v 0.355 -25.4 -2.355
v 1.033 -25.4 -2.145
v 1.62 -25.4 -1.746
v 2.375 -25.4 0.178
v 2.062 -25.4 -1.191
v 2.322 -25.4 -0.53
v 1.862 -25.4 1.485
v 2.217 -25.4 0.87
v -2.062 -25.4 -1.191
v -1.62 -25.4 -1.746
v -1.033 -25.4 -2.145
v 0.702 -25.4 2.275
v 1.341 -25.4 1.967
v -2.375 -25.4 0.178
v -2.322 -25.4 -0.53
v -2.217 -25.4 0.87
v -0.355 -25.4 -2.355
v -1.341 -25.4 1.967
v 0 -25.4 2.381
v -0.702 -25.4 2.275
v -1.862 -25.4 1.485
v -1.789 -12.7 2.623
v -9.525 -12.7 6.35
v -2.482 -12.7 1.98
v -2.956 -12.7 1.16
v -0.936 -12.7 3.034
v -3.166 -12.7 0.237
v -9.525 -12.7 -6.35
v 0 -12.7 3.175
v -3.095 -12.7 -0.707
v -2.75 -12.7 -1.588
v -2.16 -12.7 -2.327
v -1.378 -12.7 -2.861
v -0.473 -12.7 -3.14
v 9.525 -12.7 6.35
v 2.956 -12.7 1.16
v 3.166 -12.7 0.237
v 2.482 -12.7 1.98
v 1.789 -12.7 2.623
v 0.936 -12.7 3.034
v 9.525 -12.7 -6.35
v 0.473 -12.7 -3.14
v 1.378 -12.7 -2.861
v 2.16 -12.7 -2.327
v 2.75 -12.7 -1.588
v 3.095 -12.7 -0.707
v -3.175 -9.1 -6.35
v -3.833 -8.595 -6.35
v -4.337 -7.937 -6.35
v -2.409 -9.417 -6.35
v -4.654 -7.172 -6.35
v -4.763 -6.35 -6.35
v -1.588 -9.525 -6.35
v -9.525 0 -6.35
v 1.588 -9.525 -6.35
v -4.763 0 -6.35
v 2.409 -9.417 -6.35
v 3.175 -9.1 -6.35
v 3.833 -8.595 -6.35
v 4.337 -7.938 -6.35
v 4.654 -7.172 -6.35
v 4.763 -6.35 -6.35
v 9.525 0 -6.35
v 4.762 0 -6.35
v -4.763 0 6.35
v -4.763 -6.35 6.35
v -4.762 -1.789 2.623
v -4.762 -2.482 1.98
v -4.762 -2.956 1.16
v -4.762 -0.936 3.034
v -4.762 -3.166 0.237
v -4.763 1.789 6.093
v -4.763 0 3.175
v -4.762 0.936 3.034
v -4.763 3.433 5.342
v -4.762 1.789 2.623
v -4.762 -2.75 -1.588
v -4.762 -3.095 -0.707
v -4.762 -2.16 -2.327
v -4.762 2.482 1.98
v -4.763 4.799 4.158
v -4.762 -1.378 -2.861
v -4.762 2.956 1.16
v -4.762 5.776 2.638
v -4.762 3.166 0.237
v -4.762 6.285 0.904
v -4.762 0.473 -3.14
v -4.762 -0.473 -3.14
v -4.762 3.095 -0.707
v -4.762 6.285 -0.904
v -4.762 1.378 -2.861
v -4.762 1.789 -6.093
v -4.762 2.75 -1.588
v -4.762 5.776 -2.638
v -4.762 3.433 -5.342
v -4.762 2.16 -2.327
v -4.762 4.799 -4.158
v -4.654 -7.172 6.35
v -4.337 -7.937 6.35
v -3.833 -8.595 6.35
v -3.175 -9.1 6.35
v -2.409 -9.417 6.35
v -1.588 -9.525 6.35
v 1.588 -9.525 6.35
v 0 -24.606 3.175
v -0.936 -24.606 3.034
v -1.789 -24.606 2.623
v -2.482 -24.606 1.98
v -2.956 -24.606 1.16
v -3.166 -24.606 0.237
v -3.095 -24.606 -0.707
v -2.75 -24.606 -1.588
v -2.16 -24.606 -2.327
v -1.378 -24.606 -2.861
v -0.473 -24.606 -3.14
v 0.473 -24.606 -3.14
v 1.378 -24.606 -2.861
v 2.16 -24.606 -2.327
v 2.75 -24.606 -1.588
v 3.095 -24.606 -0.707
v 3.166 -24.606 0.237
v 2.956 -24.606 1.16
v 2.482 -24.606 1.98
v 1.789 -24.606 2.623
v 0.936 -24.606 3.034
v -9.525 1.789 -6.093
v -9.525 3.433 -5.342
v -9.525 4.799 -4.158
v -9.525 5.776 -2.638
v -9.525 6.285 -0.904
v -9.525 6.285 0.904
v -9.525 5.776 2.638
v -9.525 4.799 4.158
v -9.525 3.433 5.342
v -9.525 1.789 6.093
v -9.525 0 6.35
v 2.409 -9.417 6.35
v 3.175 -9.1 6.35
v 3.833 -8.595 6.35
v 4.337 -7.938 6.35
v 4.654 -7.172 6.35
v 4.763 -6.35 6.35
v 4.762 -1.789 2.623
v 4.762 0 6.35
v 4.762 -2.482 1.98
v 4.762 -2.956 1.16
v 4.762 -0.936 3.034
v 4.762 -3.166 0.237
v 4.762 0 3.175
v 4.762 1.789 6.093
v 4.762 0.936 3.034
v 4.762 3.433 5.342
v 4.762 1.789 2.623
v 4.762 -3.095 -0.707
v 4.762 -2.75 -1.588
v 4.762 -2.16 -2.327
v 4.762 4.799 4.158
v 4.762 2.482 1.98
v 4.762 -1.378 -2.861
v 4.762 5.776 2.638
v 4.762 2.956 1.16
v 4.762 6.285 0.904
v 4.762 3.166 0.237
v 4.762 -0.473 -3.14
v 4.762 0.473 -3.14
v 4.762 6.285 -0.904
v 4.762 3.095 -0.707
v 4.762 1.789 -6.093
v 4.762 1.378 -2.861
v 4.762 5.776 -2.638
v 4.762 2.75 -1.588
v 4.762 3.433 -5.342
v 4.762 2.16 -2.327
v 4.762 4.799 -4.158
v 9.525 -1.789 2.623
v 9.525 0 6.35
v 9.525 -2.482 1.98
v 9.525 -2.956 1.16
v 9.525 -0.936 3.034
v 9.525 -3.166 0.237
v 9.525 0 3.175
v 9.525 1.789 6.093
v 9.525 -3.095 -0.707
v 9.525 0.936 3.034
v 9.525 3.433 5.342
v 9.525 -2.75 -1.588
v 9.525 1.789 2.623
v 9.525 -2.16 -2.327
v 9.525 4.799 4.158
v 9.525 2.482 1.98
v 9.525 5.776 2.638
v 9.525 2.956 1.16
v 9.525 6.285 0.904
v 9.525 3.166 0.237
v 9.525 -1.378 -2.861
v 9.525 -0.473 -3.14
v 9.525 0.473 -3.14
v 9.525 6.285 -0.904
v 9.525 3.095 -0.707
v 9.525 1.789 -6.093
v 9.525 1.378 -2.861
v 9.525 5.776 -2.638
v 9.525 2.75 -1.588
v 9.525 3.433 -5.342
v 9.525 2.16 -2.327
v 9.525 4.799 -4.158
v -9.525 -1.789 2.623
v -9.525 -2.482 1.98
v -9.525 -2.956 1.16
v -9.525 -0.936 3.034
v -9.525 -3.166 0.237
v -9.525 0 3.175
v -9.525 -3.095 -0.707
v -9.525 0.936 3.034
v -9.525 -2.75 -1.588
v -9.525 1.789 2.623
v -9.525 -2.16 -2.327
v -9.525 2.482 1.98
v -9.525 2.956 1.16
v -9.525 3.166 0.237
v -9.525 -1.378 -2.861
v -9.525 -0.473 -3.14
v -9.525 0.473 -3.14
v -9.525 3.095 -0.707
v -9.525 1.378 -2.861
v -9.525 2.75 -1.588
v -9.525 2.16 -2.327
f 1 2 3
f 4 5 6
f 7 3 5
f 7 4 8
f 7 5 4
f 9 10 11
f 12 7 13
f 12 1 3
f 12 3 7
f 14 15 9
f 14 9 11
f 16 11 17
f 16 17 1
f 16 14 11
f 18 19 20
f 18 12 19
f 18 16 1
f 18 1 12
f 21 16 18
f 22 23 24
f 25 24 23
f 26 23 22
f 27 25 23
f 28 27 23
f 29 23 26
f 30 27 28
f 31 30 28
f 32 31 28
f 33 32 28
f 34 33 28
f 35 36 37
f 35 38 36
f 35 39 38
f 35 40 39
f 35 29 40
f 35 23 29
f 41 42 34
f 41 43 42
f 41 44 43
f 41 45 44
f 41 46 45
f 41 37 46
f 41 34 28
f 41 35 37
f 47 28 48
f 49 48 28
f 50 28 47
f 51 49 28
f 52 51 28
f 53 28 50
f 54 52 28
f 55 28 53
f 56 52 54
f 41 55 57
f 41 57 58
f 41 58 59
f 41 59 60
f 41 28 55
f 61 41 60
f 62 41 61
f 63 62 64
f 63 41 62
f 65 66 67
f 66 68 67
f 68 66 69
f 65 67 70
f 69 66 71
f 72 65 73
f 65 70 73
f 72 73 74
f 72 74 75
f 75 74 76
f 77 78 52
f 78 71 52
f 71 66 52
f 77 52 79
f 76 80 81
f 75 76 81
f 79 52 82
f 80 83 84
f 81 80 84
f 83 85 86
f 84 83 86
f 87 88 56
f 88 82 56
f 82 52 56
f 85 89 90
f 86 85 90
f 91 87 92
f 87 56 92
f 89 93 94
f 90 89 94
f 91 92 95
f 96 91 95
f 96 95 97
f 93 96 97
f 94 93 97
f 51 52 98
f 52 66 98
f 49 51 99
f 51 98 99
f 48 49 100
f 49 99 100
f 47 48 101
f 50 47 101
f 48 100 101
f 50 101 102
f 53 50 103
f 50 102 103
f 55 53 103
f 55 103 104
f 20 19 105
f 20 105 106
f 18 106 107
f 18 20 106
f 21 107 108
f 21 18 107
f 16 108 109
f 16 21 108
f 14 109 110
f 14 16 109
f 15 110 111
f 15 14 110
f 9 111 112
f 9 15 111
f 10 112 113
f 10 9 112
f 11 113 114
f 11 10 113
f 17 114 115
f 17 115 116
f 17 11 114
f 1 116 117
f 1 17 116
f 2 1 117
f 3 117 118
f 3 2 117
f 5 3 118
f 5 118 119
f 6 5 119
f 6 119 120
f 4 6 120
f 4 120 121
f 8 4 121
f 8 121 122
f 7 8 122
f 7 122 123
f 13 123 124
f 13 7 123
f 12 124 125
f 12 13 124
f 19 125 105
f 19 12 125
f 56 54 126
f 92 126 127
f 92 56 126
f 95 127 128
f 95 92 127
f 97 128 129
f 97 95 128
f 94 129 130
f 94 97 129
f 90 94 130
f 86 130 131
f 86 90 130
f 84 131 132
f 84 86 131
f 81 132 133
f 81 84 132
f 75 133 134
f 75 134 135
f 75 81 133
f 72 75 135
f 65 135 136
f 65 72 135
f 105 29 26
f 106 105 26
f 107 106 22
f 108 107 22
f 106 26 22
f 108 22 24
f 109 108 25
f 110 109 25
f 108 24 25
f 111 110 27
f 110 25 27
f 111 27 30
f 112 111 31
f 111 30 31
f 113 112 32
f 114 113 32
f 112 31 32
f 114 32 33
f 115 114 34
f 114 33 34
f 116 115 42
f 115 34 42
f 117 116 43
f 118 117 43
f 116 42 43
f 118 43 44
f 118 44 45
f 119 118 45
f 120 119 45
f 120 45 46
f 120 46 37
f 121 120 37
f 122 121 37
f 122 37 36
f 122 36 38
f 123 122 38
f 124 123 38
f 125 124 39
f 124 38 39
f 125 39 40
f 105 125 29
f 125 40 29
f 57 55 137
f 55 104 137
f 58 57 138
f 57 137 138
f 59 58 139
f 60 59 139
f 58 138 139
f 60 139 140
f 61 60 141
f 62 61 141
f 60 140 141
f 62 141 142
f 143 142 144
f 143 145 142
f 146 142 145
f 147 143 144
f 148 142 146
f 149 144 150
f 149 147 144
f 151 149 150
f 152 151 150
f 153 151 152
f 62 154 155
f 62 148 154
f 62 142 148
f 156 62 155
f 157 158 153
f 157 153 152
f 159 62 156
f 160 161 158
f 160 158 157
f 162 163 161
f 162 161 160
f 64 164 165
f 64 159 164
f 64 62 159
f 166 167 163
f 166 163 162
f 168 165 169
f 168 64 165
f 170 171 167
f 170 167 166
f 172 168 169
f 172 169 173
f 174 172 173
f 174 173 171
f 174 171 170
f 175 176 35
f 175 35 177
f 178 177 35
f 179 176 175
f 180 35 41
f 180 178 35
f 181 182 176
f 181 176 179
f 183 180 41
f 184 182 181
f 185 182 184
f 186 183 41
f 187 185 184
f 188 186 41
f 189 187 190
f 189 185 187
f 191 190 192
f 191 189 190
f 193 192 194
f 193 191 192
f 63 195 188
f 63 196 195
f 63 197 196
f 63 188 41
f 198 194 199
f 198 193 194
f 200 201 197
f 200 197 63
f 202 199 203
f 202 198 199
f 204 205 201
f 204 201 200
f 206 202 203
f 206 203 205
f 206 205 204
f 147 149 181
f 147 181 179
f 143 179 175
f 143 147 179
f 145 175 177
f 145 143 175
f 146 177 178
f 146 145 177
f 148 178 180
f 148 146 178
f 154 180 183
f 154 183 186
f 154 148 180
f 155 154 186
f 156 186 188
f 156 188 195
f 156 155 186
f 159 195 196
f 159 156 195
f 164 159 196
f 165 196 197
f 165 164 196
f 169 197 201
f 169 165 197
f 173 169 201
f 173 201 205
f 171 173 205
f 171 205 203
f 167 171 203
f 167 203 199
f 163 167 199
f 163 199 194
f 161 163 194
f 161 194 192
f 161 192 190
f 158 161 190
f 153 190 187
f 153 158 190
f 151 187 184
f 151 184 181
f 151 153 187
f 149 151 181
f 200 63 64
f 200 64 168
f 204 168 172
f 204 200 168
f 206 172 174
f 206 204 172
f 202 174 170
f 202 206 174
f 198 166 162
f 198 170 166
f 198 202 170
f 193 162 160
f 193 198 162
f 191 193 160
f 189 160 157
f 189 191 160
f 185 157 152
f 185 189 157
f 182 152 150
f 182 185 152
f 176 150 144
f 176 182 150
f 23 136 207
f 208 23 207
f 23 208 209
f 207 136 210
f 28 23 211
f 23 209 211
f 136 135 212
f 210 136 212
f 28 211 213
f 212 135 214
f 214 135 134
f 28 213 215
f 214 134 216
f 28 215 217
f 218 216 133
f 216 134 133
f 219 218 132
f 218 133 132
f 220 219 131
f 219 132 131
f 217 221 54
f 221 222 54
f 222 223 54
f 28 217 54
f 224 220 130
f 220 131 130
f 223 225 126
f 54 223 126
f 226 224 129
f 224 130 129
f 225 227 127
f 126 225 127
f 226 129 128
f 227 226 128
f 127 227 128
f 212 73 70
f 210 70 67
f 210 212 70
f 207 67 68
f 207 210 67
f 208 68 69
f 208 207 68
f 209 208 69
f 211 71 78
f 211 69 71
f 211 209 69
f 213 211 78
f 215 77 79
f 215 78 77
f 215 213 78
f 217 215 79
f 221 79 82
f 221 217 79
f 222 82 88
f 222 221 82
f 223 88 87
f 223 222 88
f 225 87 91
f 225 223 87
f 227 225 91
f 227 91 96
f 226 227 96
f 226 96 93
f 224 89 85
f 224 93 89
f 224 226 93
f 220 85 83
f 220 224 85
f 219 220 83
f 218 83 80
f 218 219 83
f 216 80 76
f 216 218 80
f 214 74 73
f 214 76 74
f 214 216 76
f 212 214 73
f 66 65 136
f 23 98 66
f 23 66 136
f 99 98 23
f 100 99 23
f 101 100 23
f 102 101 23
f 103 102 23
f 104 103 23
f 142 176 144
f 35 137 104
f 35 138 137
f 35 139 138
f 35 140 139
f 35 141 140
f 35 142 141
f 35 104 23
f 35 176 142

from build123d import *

# Parameters (mm, degrees)
SKETCH1_R               = 3.175
BOSS_EXTRUDE1_DEPTH     = 9.525
SKETCH2_R               = 3.175
BOSS_EXTRUDE2_DEPTH     = 12.7
CHAMFER1_SIZE           = 0.79375
CUT_EXTRUDE1_DEPTH      = 28.86051193
CUT_EXTRUDE1_DEPTH_BACK = 28.86051193
SKETCH3_W               = 9.525
SKETCH3_H               = 15.875
FILLET1_R               = 3.175


with BuildPart() as part:
    # Sketch1 → Boss-Extrude1 (new, symmetric)
    with BuildSketch(Plane(origin=(0, 0, 0), x_dir=(0, 0, -1), z_dir=(1, 0, 0))):
        with BuildLine():
            Line((-6.35, 0), (-6.35, -12.7))
            Line((-6.35, -12.7), (6.35, -12.7))
            Line((6.35, -12.7), (6.35, 0))
            ThreePointArc((6.35, 0), (0, 6.35), (-6.35, 0))
        make_face()
        with Locations(Location((0, 0, 0), (0, 0, 180))):
            Circle(SKETCH1_R, mode=Mode.SUBTRACT)
    extrude(amount=BOSS_EXTRUDE1_DEPTH, both=True)

    # Sketch2 → Boss-Extrude2 (add)
    with BuildSketch(Plane.XZ.offset(12.7)):
        with Locations(Location((0, 0, 0), (0, 0, 90))):
            Circle(SKETCH2_R)
    extrude(amount=BOSS_EXTRUDE2_DEPTH)

    # Chamfer1
    chamfer1_edges = [part.edges().sort_by_distance(p)[0] for p in [
        (0, -25.4, -3.175),
    ]]
    chamfer(chamfer1_edges, length=CHAMFER1_SIZE)

    # Sketch3 → Cut-Extrude1 (cut, two sides: drawn at the far end of the back side and taken through both)
    with BuildSketch(Plane.XY.offset(-CUT_EXTRUDE1_DEPTH_BACK)):
        with Locations((0, -1.5875)):
            Rectangle(SKETCH3_W, SKETCH3_H)
    extrude(amount=CUT_EXTRUDE1_DEPTH + CUT_EXTRUDE1_DEPTH_BACK, mode=Mode.SUBTRACT)

    # Fillet1
    fillet1_edges = [part.edges().sort_by_distance(p)[0] for p in [
        (-4.7625, -9.525, 0),
        (4.7625, -9.525, 0),
    ]]
    fillet(fillet1_edges, radius=FILLET1_R)


solid = part.part
